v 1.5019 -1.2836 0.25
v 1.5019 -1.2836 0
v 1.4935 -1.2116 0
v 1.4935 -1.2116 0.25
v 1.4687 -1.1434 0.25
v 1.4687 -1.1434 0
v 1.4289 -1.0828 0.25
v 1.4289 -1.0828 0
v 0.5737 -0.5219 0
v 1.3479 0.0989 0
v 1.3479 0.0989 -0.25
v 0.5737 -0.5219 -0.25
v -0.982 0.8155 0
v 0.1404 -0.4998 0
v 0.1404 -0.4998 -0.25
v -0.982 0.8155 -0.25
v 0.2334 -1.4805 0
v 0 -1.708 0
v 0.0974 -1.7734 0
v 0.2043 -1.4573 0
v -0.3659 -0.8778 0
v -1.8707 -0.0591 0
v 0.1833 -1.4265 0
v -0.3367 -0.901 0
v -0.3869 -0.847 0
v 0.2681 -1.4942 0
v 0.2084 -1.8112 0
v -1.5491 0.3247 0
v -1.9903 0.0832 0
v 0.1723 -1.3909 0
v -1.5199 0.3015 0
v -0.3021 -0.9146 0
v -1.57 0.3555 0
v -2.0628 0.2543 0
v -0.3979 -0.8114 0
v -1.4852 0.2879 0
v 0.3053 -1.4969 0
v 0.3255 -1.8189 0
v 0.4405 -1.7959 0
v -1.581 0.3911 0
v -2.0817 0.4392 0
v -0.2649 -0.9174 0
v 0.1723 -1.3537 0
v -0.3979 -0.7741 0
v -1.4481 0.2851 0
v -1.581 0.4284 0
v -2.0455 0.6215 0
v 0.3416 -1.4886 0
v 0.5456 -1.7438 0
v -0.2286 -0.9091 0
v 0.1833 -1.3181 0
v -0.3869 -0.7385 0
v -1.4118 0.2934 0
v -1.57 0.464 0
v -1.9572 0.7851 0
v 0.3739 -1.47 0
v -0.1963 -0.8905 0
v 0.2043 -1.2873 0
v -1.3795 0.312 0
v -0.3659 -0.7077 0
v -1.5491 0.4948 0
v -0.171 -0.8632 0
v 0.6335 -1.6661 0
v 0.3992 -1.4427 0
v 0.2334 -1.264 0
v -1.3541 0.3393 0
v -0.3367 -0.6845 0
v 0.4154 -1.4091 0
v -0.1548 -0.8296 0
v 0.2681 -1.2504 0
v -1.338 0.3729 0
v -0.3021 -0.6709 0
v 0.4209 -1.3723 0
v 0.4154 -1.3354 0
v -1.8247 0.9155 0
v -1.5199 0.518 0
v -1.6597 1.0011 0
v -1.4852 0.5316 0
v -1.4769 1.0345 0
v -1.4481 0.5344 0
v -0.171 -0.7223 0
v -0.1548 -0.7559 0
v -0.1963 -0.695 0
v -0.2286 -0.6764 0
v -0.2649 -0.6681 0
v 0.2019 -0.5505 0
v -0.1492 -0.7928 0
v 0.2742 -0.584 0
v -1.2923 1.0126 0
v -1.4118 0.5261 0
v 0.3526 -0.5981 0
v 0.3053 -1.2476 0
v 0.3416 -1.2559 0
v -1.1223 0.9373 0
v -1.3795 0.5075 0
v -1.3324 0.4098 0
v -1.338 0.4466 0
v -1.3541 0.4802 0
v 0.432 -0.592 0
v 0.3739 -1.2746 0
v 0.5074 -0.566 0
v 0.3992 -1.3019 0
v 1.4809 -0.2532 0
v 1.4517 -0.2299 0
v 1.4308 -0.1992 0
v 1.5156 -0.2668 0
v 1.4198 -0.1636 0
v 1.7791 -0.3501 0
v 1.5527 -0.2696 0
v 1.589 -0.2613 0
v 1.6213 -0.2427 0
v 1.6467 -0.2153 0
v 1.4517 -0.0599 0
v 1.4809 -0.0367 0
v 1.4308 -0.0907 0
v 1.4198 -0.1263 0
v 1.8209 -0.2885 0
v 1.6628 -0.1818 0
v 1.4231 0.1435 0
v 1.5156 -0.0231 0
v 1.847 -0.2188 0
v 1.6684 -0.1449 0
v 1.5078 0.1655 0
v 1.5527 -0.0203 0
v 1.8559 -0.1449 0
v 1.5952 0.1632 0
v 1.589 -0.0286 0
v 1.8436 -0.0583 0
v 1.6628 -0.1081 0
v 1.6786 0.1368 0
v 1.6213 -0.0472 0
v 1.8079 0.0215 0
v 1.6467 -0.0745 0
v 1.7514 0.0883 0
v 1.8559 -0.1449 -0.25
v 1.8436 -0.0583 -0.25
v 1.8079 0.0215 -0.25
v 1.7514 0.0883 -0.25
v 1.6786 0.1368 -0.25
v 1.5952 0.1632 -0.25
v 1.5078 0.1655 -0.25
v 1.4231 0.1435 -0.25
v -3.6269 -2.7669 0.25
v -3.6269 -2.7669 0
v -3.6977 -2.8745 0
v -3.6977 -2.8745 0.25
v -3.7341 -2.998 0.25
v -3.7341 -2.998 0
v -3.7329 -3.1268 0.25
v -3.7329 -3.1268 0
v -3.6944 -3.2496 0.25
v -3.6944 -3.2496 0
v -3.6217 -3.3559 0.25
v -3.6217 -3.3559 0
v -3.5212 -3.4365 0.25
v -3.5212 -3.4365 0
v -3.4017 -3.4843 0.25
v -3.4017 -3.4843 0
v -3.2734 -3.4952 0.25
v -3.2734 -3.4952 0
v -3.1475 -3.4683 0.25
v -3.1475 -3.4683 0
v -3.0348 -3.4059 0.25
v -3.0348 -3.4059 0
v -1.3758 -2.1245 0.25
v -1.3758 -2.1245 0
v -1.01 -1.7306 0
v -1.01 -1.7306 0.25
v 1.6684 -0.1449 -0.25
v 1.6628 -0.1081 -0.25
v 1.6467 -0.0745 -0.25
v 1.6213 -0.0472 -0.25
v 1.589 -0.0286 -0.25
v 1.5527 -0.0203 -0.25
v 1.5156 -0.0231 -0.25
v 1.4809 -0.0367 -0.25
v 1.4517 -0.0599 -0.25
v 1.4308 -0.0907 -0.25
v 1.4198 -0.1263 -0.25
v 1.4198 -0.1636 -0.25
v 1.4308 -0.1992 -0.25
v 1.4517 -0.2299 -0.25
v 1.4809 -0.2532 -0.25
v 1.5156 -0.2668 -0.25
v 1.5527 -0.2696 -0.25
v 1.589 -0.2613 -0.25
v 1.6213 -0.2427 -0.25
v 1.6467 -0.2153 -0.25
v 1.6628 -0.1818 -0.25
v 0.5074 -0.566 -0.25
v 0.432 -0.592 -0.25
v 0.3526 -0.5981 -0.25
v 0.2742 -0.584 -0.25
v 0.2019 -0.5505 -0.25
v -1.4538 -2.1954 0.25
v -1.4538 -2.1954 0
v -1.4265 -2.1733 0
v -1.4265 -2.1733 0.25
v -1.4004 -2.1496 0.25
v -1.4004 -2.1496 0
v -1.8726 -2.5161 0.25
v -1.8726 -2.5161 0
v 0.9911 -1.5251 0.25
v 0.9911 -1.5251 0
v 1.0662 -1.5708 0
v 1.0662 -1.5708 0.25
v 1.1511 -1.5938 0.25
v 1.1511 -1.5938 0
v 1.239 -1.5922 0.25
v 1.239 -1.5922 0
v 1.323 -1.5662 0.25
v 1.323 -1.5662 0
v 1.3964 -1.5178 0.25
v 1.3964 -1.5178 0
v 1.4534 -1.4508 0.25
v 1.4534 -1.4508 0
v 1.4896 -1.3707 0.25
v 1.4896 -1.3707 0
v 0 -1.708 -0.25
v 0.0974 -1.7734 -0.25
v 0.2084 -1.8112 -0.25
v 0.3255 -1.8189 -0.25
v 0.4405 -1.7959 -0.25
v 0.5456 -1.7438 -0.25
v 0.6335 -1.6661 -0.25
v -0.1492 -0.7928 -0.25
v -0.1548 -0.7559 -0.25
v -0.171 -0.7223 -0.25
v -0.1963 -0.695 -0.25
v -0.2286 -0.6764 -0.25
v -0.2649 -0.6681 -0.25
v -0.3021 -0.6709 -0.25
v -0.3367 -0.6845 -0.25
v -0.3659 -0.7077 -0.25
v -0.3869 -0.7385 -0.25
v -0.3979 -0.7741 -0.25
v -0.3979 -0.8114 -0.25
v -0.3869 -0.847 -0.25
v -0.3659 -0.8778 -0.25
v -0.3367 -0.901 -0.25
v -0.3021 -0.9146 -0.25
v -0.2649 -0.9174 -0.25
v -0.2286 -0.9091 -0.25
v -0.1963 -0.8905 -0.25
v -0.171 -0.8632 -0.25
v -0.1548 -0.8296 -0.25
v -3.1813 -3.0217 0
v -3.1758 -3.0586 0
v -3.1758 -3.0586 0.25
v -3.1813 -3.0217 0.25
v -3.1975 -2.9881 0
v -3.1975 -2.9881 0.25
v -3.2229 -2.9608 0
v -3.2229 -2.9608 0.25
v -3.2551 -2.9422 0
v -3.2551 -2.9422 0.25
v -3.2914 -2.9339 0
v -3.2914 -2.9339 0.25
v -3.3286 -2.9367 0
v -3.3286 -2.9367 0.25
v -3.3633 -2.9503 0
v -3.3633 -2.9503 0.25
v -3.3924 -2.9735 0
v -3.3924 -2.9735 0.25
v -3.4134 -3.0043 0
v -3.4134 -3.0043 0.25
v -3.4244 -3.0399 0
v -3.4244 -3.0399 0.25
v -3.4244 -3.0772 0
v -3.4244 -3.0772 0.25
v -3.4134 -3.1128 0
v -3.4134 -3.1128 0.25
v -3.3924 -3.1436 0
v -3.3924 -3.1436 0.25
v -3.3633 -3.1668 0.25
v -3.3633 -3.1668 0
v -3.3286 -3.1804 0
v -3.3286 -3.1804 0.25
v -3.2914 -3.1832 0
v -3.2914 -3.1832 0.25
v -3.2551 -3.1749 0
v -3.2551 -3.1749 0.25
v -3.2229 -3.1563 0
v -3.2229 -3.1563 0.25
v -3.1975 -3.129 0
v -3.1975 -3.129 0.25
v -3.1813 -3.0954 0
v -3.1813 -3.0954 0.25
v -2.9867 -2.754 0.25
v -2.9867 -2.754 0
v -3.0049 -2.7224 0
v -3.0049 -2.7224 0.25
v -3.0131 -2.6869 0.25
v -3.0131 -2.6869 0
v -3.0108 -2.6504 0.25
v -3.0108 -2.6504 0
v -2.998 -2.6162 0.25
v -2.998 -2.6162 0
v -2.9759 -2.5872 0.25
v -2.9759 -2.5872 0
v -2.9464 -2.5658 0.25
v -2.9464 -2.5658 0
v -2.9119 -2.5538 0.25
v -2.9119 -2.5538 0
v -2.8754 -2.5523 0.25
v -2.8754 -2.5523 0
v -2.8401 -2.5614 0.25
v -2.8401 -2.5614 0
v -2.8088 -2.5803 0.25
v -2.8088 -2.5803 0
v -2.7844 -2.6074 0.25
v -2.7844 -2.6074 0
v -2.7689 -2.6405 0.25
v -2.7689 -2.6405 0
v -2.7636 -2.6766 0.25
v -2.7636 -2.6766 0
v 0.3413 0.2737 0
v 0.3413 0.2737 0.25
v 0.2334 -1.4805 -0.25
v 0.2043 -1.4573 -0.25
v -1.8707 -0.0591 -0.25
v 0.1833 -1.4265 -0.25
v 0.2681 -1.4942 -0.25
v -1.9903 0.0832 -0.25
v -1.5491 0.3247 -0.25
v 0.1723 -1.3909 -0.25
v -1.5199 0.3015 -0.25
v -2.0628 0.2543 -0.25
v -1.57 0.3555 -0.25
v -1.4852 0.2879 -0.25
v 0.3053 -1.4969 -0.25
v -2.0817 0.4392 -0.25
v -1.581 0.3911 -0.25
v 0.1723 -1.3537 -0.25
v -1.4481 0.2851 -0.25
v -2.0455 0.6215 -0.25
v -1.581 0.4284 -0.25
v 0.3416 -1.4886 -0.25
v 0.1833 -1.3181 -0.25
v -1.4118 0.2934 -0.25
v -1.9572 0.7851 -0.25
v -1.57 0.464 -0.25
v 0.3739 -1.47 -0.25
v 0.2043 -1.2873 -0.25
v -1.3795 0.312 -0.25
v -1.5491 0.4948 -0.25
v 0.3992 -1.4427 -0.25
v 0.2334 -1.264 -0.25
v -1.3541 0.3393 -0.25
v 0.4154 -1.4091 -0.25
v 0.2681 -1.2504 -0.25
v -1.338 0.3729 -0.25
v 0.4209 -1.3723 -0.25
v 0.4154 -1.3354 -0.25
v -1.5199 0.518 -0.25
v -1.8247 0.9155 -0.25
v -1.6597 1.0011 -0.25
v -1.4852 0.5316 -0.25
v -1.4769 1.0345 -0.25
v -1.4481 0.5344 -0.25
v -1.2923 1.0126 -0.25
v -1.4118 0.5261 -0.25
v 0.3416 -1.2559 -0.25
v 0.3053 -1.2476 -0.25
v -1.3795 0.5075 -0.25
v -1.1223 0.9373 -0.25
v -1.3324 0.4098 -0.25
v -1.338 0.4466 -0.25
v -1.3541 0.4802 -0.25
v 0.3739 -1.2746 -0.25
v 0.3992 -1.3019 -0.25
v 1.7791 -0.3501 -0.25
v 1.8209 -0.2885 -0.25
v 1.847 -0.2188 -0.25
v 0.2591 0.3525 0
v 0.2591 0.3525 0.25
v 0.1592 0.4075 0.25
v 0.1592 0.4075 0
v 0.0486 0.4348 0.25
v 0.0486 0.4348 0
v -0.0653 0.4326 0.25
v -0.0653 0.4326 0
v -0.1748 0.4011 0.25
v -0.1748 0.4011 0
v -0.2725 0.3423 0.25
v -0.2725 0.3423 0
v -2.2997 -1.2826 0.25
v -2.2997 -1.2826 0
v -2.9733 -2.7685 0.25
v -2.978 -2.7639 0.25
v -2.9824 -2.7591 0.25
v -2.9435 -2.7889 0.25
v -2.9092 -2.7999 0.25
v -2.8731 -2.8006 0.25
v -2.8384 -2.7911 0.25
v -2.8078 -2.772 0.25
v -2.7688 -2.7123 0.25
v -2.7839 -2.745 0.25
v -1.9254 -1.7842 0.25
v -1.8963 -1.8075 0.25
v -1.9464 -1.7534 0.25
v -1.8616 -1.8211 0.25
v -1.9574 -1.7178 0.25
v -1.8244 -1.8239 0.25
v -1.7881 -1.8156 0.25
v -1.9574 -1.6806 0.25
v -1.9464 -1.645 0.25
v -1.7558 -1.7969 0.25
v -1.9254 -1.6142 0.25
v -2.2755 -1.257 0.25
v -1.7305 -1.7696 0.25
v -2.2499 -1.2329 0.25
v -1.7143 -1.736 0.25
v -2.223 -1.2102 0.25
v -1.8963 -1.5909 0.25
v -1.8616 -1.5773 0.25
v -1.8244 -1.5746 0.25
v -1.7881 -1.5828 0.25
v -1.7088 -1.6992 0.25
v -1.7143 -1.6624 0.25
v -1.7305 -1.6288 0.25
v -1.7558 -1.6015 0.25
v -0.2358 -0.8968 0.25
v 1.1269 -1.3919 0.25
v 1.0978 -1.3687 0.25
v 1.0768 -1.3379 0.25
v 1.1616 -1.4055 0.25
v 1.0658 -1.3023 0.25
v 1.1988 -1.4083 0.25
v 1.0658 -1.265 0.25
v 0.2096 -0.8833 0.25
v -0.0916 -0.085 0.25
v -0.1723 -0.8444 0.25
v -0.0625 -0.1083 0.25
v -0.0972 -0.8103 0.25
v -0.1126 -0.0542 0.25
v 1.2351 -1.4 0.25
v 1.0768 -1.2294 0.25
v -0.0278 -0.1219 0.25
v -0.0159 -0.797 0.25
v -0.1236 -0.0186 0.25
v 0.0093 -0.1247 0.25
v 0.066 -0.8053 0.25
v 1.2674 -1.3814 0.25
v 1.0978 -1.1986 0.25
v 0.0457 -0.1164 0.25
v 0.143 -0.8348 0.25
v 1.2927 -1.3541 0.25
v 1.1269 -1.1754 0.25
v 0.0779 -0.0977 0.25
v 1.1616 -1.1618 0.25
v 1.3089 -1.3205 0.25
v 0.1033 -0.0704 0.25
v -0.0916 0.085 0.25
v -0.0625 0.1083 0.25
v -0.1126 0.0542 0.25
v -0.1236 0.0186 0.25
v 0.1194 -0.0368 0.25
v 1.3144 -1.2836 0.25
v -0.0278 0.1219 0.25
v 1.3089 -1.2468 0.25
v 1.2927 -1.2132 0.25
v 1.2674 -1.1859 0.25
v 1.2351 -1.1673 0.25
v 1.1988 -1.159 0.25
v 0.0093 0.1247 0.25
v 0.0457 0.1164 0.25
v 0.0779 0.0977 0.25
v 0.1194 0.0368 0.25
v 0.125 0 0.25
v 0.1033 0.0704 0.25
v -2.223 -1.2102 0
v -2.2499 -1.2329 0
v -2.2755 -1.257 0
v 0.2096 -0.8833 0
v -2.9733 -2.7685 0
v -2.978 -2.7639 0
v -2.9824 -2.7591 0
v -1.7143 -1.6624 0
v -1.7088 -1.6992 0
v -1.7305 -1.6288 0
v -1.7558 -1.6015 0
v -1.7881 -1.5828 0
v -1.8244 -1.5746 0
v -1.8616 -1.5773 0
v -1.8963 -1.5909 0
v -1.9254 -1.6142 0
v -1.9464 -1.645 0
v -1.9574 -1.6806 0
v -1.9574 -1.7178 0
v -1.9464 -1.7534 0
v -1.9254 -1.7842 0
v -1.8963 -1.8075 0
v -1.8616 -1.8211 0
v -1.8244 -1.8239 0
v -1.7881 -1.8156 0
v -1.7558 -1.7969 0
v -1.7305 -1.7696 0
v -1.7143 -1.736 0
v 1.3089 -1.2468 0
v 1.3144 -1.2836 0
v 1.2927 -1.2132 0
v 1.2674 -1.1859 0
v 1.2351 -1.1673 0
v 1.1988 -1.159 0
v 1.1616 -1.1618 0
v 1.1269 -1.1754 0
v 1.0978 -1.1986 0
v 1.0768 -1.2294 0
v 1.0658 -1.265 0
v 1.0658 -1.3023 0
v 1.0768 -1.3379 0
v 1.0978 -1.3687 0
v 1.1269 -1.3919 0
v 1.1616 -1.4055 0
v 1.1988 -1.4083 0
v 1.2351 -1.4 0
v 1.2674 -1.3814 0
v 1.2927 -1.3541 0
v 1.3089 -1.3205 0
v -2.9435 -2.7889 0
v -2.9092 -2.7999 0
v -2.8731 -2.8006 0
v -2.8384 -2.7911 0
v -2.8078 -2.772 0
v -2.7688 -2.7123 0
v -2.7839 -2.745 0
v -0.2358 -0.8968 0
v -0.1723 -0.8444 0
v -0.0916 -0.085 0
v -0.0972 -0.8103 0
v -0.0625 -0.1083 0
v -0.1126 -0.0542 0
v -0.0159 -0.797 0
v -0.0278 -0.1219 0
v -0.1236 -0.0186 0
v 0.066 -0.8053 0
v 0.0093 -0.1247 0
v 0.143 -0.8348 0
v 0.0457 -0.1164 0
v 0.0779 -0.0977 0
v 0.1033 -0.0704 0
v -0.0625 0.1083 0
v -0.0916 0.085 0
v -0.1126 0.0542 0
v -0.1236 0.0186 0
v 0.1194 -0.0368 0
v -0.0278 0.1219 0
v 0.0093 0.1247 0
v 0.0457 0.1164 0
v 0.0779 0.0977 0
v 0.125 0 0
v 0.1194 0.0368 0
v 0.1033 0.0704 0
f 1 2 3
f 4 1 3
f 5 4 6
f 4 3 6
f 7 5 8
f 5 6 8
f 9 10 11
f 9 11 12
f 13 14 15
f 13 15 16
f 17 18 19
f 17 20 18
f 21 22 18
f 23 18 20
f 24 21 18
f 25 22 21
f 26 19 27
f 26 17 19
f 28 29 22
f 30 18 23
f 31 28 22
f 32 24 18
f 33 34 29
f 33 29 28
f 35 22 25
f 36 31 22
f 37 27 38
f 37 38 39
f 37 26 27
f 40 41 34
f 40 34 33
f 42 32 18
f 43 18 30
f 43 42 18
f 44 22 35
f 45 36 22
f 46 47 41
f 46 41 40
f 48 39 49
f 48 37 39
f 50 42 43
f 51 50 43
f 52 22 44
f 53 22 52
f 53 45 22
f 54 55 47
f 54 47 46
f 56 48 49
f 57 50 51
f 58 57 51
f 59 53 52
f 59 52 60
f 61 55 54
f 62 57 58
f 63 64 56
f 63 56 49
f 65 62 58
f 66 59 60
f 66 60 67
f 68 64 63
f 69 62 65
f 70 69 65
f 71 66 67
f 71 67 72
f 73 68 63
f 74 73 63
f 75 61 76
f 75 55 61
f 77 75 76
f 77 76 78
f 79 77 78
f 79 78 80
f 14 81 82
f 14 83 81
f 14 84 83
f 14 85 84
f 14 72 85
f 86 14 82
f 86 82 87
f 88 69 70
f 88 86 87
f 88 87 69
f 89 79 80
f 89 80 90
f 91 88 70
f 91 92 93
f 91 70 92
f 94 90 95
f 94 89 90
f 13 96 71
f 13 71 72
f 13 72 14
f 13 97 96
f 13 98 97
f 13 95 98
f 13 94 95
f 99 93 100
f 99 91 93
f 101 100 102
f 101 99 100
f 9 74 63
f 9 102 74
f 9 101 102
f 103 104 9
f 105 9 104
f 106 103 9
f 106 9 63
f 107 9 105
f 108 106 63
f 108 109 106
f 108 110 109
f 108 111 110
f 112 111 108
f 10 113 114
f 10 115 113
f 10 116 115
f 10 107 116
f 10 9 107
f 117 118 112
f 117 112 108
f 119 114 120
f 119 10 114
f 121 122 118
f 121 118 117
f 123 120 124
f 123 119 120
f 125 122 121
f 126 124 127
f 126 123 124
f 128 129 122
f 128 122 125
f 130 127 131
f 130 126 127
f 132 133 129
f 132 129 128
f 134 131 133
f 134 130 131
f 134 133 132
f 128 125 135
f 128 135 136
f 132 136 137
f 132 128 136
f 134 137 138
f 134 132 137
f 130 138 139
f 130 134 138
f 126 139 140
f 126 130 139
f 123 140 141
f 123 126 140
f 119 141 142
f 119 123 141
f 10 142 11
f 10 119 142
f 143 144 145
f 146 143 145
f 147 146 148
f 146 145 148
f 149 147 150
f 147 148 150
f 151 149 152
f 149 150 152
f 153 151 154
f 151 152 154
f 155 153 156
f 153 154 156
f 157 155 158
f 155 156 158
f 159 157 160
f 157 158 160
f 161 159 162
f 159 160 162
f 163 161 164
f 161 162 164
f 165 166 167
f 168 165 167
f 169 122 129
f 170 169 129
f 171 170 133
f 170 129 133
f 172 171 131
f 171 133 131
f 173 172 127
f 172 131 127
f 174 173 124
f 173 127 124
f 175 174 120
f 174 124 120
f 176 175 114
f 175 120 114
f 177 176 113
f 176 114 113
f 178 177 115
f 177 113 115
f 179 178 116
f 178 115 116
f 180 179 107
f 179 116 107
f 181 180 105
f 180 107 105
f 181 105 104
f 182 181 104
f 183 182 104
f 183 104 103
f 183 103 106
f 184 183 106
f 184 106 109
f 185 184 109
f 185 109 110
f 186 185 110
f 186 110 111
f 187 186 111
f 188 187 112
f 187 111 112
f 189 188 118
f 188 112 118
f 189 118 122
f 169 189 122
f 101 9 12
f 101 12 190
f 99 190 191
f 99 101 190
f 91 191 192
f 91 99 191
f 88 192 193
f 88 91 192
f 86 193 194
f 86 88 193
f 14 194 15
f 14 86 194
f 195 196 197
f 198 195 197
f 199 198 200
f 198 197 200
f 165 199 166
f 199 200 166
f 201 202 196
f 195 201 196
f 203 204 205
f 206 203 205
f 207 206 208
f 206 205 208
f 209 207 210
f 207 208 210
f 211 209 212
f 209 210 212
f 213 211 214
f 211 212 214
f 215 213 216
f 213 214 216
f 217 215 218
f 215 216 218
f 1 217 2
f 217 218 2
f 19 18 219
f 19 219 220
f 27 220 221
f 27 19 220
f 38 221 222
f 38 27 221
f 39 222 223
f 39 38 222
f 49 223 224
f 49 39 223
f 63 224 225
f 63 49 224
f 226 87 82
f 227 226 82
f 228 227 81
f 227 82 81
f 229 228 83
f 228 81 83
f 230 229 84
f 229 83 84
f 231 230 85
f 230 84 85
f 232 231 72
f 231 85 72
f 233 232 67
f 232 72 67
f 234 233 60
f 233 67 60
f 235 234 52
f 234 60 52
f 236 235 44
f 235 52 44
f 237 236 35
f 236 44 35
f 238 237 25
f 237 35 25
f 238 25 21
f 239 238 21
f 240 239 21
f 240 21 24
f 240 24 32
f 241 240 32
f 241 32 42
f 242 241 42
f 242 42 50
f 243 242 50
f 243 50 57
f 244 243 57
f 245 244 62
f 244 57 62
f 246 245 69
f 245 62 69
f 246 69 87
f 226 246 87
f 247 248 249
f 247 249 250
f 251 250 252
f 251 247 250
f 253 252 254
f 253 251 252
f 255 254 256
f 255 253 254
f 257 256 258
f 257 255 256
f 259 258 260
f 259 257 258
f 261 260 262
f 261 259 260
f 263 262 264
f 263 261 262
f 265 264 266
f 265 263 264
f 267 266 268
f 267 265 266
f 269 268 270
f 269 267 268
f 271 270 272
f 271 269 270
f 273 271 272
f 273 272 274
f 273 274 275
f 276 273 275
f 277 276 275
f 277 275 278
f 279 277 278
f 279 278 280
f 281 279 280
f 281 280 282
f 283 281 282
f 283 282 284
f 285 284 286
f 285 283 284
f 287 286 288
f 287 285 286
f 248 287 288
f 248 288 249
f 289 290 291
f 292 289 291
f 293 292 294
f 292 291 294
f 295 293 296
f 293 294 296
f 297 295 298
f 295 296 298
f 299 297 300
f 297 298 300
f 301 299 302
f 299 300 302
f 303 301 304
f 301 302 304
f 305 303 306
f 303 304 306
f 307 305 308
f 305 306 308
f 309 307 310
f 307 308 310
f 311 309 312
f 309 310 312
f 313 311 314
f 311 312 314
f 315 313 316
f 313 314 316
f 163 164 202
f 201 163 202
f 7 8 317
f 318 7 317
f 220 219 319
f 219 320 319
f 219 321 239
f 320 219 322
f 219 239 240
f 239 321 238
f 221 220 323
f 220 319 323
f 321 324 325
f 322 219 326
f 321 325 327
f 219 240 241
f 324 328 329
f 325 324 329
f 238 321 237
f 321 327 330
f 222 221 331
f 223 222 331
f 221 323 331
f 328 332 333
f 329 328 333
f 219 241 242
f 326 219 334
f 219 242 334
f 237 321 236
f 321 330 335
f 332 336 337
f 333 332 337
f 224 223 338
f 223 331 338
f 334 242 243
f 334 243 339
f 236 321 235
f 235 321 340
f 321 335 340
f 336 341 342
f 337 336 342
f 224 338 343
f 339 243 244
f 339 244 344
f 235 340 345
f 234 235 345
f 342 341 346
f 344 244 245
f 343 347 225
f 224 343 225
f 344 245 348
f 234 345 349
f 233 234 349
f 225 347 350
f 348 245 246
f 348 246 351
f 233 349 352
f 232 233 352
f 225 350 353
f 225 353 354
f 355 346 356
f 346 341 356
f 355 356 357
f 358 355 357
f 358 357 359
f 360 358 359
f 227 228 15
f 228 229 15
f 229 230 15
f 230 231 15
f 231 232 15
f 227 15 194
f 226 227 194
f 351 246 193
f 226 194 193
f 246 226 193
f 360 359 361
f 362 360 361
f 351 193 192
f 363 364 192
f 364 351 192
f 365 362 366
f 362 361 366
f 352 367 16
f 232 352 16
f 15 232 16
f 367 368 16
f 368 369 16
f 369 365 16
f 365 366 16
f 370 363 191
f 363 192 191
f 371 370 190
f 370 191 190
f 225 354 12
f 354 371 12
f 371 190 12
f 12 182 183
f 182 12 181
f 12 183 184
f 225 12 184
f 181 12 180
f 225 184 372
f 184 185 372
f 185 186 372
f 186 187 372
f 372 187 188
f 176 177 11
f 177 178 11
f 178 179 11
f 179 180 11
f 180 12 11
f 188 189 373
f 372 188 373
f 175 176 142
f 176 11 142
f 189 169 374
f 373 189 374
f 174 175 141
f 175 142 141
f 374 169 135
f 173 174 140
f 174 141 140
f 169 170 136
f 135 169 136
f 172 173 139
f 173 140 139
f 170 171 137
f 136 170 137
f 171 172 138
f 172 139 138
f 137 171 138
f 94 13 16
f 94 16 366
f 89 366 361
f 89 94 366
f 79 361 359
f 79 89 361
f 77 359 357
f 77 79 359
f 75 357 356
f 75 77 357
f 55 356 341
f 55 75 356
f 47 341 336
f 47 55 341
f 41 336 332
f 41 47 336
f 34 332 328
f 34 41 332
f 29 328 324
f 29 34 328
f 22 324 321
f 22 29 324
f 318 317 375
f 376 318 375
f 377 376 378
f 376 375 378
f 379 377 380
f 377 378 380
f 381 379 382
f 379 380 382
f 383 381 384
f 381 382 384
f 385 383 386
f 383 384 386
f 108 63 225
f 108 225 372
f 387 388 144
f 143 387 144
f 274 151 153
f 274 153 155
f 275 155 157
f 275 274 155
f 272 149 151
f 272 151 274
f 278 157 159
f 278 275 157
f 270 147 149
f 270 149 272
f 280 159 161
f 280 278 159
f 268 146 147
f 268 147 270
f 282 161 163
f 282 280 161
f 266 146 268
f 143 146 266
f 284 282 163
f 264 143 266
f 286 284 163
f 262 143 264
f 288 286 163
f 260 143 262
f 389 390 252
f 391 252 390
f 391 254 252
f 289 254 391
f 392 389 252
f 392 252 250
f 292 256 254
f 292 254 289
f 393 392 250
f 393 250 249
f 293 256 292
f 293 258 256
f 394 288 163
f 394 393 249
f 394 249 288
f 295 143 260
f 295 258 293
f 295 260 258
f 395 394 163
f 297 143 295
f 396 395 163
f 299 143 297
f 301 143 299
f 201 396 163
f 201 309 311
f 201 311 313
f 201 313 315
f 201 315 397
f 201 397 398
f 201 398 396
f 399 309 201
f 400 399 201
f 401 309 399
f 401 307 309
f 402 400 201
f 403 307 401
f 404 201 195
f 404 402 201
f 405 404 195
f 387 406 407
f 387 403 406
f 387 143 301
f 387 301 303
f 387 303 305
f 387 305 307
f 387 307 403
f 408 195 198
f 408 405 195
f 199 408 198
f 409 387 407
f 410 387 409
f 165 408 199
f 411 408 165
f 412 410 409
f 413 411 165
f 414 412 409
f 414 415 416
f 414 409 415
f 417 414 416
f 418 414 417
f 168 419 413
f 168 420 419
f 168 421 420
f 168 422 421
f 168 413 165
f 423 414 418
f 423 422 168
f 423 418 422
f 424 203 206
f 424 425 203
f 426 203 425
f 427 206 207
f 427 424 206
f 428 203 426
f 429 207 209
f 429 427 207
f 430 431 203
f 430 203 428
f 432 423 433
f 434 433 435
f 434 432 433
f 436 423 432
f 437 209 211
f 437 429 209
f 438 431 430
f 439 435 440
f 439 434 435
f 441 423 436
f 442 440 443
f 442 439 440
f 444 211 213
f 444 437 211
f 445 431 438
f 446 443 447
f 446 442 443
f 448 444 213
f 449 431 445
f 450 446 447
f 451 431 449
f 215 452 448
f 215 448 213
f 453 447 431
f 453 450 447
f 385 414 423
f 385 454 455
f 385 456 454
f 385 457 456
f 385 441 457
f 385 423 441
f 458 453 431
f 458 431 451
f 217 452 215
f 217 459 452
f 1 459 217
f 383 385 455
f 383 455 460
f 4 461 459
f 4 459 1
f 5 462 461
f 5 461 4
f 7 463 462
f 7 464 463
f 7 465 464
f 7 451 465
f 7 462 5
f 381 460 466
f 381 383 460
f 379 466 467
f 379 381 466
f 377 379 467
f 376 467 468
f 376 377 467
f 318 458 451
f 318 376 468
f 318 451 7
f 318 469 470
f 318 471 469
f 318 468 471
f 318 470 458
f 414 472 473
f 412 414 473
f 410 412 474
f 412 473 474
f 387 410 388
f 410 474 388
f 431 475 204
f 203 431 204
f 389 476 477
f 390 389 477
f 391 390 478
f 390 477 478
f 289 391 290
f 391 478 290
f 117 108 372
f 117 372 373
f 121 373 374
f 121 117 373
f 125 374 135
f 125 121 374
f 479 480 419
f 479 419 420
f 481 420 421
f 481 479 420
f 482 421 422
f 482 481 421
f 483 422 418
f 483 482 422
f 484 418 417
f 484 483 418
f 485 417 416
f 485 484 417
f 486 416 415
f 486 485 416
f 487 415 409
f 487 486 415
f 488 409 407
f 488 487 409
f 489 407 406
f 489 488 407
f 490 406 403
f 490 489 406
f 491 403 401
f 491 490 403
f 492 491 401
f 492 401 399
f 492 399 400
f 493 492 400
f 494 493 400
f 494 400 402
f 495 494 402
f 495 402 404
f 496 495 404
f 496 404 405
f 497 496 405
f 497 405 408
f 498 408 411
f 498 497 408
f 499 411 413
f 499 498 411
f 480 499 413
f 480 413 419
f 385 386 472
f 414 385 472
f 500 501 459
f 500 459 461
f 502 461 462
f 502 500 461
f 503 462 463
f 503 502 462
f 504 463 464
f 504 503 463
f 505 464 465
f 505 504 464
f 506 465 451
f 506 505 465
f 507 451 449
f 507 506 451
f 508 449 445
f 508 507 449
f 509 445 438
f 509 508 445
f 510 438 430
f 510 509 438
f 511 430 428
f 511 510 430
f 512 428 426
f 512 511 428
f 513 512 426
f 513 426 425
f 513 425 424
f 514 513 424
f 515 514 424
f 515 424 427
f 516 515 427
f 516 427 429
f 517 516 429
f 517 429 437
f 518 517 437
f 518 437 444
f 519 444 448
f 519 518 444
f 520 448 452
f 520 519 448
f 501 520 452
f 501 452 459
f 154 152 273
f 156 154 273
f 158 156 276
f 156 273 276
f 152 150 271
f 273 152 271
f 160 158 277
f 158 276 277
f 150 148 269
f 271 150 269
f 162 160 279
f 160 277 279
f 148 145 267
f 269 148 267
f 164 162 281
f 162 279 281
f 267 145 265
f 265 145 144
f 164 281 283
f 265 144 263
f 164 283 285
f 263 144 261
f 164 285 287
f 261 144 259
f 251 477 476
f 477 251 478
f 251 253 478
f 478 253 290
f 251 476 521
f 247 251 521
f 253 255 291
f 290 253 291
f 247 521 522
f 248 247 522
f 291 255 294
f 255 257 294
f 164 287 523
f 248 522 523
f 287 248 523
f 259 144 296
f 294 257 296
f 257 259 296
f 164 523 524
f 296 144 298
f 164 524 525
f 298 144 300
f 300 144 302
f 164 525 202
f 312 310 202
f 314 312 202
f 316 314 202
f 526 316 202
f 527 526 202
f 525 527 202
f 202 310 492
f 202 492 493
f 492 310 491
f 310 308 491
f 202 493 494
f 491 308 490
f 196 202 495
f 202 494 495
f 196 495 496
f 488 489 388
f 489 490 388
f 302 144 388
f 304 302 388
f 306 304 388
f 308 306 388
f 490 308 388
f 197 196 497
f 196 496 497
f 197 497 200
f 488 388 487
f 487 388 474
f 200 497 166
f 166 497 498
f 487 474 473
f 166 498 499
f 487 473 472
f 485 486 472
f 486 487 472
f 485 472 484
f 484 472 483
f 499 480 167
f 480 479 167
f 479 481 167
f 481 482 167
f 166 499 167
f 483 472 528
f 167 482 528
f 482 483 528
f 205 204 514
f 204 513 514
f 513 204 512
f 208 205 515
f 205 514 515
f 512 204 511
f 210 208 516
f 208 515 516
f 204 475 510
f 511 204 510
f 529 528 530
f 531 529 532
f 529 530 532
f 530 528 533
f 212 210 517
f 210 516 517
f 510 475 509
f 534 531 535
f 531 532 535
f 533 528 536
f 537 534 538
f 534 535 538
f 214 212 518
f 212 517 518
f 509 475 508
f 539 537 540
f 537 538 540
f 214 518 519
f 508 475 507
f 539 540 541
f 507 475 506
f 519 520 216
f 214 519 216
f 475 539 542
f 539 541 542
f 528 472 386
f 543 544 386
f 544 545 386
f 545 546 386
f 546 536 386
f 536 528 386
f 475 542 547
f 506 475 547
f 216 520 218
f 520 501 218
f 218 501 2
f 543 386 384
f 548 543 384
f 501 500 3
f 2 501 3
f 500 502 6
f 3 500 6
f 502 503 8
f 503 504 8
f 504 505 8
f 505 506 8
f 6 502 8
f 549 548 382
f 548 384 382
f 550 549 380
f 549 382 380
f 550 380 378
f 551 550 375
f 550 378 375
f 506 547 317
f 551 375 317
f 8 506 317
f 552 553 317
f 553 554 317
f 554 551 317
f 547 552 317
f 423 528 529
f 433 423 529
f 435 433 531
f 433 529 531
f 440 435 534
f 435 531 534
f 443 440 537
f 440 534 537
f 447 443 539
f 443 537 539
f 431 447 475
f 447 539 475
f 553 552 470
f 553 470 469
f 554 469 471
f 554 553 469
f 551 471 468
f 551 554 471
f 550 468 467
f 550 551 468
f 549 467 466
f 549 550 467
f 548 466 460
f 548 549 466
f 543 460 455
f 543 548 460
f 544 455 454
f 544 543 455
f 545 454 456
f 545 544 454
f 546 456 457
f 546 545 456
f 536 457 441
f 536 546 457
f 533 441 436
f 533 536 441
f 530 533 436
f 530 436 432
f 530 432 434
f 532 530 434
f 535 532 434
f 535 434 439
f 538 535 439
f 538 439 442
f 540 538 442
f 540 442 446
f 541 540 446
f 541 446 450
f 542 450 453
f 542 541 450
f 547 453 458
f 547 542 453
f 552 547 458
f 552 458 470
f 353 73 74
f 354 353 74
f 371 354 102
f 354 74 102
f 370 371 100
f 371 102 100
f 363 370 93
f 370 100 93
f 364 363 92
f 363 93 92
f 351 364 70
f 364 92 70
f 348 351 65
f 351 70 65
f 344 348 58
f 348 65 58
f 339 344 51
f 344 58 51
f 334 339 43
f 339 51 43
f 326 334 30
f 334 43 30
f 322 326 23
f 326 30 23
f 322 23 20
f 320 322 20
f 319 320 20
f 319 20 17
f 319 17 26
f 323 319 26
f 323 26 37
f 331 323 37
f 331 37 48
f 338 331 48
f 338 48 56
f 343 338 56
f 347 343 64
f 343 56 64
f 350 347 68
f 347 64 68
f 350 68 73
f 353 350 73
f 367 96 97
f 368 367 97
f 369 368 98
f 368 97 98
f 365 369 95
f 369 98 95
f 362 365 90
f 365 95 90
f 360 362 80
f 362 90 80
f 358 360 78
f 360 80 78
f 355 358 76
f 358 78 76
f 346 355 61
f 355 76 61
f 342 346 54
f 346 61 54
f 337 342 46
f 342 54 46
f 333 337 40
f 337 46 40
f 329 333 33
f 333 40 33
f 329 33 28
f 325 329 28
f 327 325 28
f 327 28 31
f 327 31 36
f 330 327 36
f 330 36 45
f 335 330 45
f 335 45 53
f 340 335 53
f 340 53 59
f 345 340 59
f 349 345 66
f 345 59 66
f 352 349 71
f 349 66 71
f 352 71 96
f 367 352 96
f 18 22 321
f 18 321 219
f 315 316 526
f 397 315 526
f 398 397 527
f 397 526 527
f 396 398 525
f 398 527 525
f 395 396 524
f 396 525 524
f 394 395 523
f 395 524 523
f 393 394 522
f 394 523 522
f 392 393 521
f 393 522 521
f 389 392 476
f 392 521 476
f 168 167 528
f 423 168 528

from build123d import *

# Parameters (mm, degrees)
F0_R     = 0.125
F1_DEPTH = 0.25
F2_R     = 0.125
F3_DEPTH = 0.25


# Not quite as in the source:
# - ends of sketch curves that miss each other by under 0.0002 mm in the source are joined


with BuildPart() as f1:
    # F0 (on Top) → F1 (new body)
    with BuildSketch(Plane.XY):
        with BuildLine():
            Line((-2.2996791372, -1.2826026726), (-3.6269232135, -2.7669432373))
            ThreePointArc((-3.6269232135, -2.7669432373), (-3.3095959941, -2.6211509221), (-2.9866564556, -2.7540494466))
            ThreePointArc((-2.9866564556, -2.7540494466), (-2.929558128, -2.5584979333), (-2.7635556745, -2.6765817968))
            ThreePointArc((-2.7635556745, -2.6765817968), (-2.8383720153, -2.7910658584), (-2.9732612801, -2.7685054629))
            ThreePointArc((-2.9732612801, -2.7685054629), (-2.8917036664, -2.9034596896), (-2.8632873376, -3.0585622361))
            ThreePointArc((-2.8632873376, -3.0585622361), (-2.9085080639, -3.2522713516), (-3.0348220642, -3.4059362756))
            Line((-3.0348220642, -3.4059362756), (-1.8725849919, -2.5160750152))
            Line((-1.8725849919, -2.5160750152), (-2.2590622172, -2.1571883185))
            ThreePointArc((-2.2590622172, -2.1571883185), (-2.4580978323, -1.7281958222), (-2.2996791372, -1.2826026726))
        make_face()
        with BuildLine():
            ThreePointArc((-2.9866564556, -2.7540494466), (-3.3095959941, -2.6211509221), (-3.6269232135, -2.7669432373))
            ThreePointArc((-3.6269232135, -2.7669432373), (-3.6216972176, -3.3559224535), (-3.0348220642, -3.4059362756))
            ThreePointArc((-3.0348220642, -3.4059362756), (-2.9085080639, -3.2522713516), (-2.8632873376, -3.0585622361))
            ThreePointArc((-2.8632873376, -3.0585622361), (-2.8917036664, -2.9034596896), (-2.9732612801, -2.7685054629))
            ThreePointArc((-2.9732612801, -2.7685054629), (-2.9802442117, -2.7615418589), (-2.9866564556, -2.7540494466))
        make_face()
        with Locations((-3.3007873376, -3.0585622361)):
            Circle(F0_R, mode=Mode.SUBTRACT)
        with BuildLine():
            Line((-0.2724544714, 0.3423080645), (-2.2229914165, -1.2101897215))
            ThreePointArc((-2.2229914165, -1.2101897215), (-1.7632079583, -1.0781973023), (-1.3447592224, -1.3099805689))
            Line((-1.3447592224, -1.3099805689), (-1.0099910743, -1.7305786829))
            Line((-1.0099910743, -1.7305786829), (-0.235769164, -0.8968360602))
            ThreePointArc((-0.235769164, -0.8968360602), (-0.0159442132, -0.796967297), (0.2095545573, -0.8832637821))
            Line((0.2095545573, -0.8832637821), (0.9911066788, -1.5251344451))
            ThreePointArc((0.9911066788, -1.5251344451), (0.967333205, -1.0638113252), (1.4288770162, -1.0828247256))
            Line((1.4288770162, -1.0828247256), (0.3413302011, 0.2736785411))
            ThreePointArc((0.3413302011, 0.2736785411), (0.4127579272, 0.1450418682), (0.4375, 0))
            ThreePointArc((0.4375, 0), (-0.1900097613, -0.3940844334), (-0.2724544714, 0.3423080645))
        make_face()
        with BuildLine():
            Line((-1.0099910743, -1.7305786829), (-1.3447592224, -1.3099805689))
            ThreePointArc((-1.3447592224, -1.3099805689), (-1.2437465061, -1.493054693), (-1.2087707431, -1.6992012423))
            ThreePointArc((-1.2087707431, -1.6992012423), (-1.2520204003, -1.9276559176), (-1.3757836668, -2.1244927164))
            Line((-1.3757836668, -2.1244927164), (-1.0099910743, -1.7305786829))
        make_face()
        with BuildLine():
            Line((-2.2590622172, -2.1571883185), (-1.8725849919, -2.5160750152))
            Line((-1.8725849919, -2.5160750152), (-1.4538203525, -2.1954498702))
            ThreePointArc((-1.4538203525, -2.1954498702), (-1.8634345266, -2.3234968933), (-2.2590622172, -2.1571883185))
        make_face()
        with BuildLine():
            ThreePointArc((1.5019408696, -1.2836395202), (1.4831073861, -1.1767927743), (1.4288770162, -1.0828247256))
            ThreePointArc((1.4288770162, -1.0828247256), (0.967333205, -1.0638113252), (0.9911066788, -1.5251344451))
            ThreePointArc((0.9911066788, -1.5251344451), (1.3230013716, -1.5661600368), (1.5019408696, -1.2836395202))
        make_face()
        with Locations((1.1894408696, -1.2836395202)):
            Circle(F0_R, mode=Mode.SUBTRACT)
        with BuildLine():
            ThreePointArc((0.3413302011, 0.2736785411), (0.0486155264, 0.434790502), (-0.2724544714, 0.3423080645))
            ThreePointArc((-0.2724544714, 0.3423080645), (-0.1900097613, -0.3940844334), (0.4375, 0))
            ThreePointArc((0.4375, 0), (0.4127579272, 0.1450418682), (0.3413302011, 0.2736785411))
        make_face()
        Circle(F0_R, mode=Mode.SUBTRACT)
        with BuildLine():
            ThreePointArc((-2.2229914165, -1.2101897215), (-2.2628655338, -1.2447756041), (-2.2996791372, -1.2826026726))
            ThreePointArc((-2.2996791372, -1.2826026726), (-2.4580978323, -1.7281958222), (-2.2590622172, -2.1571883185))
            ThreePointArc((-2.2590622172, -2.1571883185), (-1.8634345266, -2.3234968933), (-1.4538203525, -2.1954498702))
            ThreePointArc((-1.4538203525, -2.1954498702), (-1.4133025172, -2.161620393), (-1.3757836668, -2.1244927164))
            ThreePointArc((-1.3757836668, -2.1244927164), (-1.2520204003, -1.9276559176), (-1.2087707431, -1.6992012423))
            ThreePointArc((-1.2087707431, -1.6992012423), (-1.2437465061, -1.493054693), (-1.3447592224, -1.3099805689))
            ThreePointArc((-1.3447592224, -1.3099805689), (-1.7632079583, -1.0781973023), (-2.2229914165, -1.2101897215))
        make_face()
        with Locations((-1.8337707431, -1.6992012423)):
            Circle(F0_R, mode=Mode.SUBTRACT)
    extrude(amount=F1_DEPTH)


with BuildPart() as f3:
    # F2 (on Top) → F3 (new body)
    with BuildSketch(Plane.XY):
        with BuildLine():
            ThreePointArc((-1.870700672, -0.0590971542), (-1.200201281, -0.1598547273), (-0.8324240634, 0.4097604412))
            ThreePointArc((-0.8324240634, 0.4097604412), (-0.8710081498, 0.6259579813), (-0.9819964676, 0.8154618107))
            ThreePointArc((-0.9819964676, 0.8154618107), (-1.8958063533, 0.8552331878), (-1.870700672, -0.0590971542))
        make_face()
        with Locations((-1.4574240634, 0.4097604412)):
            Circle(F2_R, mode=Mode.SUBTRACT)
        with BuildLine():
            ThreePointArc((-0.9819964676, 0.8154618107), (-0.8710081498, 0.6259579813), (-0.8324240634, 0.4097604412))
            ThreePointArc((-0.8324240634, 0.4097604412), (-1.200201281, -0.1598547273), (-1.870700672, -0.0590971542))
            Line((-1.870700672, -0.0590971542), (0, -1.708034565))
            ThreePointArc((0, -1.708034565), (0.1117499025, -0.9643858319), (0.7435082666, -1.3722863692))
            ThreePointArc((0.7435082666, -1.3722863692), (0.7151127049, -1.529165986), (0.6335291351, -1.6661391338))
            Line((0.6335291351, -1.6661391338), (1.7790889936, -0.3501030424))
            ThreePointArc((1.7790889936, -0.3501030424), (1.3179886014, -0.3613874071), (1.3478948326, 0.0988804778))
            Line((1.3478948326, 0.0988804778), (0.5736895844, -0.5218772581))
            ThreePointArc((0.5736895844, -0.5218772581), (0.3526119109, -0.5981064496), (0.1404071565, -0.4998447095))
            Line((0.1404071565, -0.4998447095), (-0.9819964676, 0.8154618107))
        make_face()
        with Locations((-0.274249447, -0.7927647465)):
            Circle(F2_R, mode=Mode.SUBTRACT)
        with BuildLine():
            ThreePointArc((0.7435082666, -1.3722863692), (0.1117499025, -0.9643858319), (0, -1.708034565))
            ThreePointArc((0, -1.708034565), (0.3254795809, -1.8188724567), (0.6335291351, -1.6661391338))
            ThreePointArc((0.6335291351, -1.6661391338), (0.7151127049, -1.529165986), (0.7435082666, -1.3722863692))
        make_face()
        with Locations((0.2959467375, -1.3722863692)):
            Circle(F2_R, mode=Mode.SUBTRACT)
        with BuildLine():
            ThreePointArc((1.8558795048, -0.1449268086), (1.6785965339, 0.1368046327), (1.3478948326, 0.0988804778))
            ThreePointArc((1.3478948326, 0.0988804778), (1.3179886014, -0.3613874071), (1.7790889936, -0.3501030424))
            ThreePointArc((1.7790889936, -0.3501030424), (1.8360529279, -0.2544645527), (1.8558795048, -0.1449268086))
        make_face()
        with Locations((1.5433795048, -0.1449268086)):
            Circle(F2_R, mode=Mode.SUBTRACT)
    extrude(amount=-F3_DEPTH)


solid = Compound([f1.part, f3.part])
